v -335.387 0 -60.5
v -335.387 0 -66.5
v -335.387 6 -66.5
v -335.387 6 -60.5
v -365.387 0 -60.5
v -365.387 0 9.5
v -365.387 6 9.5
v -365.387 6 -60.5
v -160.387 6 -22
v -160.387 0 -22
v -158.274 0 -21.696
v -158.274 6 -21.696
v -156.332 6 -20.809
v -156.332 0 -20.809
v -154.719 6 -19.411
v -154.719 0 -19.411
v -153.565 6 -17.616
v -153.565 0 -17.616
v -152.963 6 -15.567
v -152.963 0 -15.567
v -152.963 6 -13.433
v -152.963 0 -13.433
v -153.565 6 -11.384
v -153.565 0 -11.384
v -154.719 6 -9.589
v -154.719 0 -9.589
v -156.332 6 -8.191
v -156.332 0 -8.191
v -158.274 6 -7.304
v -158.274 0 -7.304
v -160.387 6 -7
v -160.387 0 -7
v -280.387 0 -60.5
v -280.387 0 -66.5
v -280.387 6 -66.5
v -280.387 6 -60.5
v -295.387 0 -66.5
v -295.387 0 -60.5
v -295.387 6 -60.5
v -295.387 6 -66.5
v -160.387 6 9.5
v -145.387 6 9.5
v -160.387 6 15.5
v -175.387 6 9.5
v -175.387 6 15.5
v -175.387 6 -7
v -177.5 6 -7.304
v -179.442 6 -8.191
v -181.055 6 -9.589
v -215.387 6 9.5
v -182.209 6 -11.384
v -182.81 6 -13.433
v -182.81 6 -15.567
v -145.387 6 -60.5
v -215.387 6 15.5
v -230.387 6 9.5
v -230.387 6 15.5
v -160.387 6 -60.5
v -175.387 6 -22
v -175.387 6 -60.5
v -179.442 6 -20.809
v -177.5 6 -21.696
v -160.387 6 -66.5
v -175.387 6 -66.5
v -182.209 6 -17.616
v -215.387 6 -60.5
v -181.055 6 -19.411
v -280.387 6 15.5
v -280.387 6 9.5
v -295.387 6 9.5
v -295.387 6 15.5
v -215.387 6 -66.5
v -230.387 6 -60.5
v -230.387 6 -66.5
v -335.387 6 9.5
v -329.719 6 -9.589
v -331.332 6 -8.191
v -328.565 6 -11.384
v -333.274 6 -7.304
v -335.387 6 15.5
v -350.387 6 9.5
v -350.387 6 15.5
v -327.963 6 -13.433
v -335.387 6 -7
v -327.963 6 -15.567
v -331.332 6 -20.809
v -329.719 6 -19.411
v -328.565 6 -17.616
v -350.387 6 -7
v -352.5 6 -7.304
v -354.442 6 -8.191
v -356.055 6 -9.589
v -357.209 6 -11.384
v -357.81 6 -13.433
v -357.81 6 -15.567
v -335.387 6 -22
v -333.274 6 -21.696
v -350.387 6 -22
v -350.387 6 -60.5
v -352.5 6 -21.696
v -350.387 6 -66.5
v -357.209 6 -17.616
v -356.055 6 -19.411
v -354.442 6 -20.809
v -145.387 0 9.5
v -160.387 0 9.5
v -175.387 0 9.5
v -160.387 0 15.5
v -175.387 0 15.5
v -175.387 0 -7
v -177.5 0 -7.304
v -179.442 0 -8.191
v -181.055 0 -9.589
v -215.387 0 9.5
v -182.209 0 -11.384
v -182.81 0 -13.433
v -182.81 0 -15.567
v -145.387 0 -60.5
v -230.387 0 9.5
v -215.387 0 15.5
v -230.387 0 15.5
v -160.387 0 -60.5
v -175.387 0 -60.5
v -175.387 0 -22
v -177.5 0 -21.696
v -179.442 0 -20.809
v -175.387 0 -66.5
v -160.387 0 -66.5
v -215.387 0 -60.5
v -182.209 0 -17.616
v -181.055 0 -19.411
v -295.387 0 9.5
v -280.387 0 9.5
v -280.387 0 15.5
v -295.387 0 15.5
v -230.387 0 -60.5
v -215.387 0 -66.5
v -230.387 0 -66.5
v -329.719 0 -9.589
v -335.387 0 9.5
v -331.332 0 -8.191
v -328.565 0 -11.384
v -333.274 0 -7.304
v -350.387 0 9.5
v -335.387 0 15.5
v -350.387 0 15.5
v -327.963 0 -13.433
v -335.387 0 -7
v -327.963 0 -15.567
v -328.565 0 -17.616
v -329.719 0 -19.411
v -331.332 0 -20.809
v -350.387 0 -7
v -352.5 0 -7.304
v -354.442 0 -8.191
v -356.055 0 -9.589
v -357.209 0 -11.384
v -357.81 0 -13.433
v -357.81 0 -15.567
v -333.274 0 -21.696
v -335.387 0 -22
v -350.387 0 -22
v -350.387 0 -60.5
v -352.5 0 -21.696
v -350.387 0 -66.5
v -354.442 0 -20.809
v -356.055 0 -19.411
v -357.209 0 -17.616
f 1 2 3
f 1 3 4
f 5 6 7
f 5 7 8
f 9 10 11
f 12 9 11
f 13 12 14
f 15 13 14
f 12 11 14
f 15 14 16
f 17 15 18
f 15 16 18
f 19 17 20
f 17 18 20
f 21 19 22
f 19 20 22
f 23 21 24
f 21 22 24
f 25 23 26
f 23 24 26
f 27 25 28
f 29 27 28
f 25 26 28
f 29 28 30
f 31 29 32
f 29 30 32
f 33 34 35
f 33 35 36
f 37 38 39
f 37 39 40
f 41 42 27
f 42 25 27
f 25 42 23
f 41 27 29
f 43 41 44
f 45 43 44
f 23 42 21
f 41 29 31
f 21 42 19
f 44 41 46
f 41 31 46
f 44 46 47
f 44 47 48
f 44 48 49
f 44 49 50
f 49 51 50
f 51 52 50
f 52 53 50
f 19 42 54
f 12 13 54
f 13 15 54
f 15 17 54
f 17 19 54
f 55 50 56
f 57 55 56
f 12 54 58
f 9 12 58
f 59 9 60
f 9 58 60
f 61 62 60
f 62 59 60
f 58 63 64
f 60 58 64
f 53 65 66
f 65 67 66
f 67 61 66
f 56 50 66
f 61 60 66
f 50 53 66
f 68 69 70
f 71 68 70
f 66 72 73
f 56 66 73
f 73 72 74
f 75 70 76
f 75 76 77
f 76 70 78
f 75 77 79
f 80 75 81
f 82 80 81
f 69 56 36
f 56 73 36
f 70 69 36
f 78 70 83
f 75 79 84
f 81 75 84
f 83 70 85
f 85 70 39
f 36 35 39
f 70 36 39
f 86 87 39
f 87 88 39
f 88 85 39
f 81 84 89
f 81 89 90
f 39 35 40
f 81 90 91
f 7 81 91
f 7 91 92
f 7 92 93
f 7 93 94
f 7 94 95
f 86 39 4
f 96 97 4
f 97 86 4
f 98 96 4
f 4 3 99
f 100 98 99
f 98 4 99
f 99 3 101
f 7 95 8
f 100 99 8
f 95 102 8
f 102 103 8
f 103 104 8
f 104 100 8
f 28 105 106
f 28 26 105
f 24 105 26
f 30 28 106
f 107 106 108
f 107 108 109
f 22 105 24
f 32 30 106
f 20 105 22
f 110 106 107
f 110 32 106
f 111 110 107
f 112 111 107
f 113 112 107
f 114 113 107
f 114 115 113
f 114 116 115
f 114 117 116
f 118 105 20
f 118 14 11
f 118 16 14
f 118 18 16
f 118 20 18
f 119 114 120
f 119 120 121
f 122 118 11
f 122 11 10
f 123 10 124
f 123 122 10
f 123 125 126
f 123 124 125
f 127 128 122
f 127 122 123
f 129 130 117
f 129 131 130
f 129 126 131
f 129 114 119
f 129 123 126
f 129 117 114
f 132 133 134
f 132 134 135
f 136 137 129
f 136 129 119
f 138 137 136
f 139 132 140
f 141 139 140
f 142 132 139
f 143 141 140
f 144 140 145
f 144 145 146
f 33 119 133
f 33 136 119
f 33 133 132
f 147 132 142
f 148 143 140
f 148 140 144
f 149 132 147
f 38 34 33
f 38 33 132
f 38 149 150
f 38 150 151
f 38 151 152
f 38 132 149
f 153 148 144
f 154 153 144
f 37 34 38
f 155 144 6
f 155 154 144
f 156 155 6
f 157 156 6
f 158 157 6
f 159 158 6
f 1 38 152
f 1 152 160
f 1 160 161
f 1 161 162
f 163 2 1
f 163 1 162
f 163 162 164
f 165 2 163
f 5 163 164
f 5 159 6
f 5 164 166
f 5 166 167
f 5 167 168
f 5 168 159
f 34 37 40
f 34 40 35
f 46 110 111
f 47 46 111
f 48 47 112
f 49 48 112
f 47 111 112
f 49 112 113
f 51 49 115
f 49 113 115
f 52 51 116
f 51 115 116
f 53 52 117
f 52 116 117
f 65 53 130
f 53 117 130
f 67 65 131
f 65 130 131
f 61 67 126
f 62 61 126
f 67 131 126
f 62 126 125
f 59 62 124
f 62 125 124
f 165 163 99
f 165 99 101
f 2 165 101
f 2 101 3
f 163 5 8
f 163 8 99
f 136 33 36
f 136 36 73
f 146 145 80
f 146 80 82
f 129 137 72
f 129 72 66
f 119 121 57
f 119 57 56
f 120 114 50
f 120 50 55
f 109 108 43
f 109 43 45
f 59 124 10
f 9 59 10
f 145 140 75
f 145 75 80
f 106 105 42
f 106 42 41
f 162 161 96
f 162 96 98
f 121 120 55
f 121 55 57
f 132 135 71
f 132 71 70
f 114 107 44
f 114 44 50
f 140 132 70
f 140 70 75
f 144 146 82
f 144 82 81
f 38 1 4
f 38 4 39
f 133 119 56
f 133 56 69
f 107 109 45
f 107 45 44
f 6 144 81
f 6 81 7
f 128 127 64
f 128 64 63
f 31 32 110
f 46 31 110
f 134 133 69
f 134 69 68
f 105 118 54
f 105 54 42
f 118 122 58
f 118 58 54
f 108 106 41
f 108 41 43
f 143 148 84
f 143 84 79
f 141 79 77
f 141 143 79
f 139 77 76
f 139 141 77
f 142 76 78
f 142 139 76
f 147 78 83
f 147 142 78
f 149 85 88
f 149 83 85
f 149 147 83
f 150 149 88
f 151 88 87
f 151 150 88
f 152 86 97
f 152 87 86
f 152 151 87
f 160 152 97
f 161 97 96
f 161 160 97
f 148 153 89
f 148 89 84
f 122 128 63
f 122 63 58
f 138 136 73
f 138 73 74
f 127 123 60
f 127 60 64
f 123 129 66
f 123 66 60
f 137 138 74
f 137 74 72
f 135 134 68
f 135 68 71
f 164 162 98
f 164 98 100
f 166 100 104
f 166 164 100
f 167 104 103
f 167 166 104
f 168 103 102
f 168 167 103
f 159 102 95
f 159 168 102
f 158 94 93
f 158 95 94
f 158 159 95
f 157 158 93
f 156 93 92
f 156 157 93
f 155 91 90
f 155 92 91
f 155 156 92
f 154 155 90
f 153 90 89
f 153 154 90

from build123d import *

# Parameters (mm, degrees)
BOSS_EXTRUDE1_DEPTH = 6
CUT_EXTRUDE1_DEPTH  = 10


with BuildPart() as part:
    # Sketch1 → Boss-Extrude1 (new body)
    with BuildSketch(Plane(origin=(0, 0, 0), x_dir=(1, 0, 0), z_dir=(0, 1, 0))):
        Polygon((-160.386748432, 60.5), (-145.386748432, 60.5), (-145.386748432, -9.5), (-160.386748432, -9.5), (-160.386748432, -15.5), (-175.386748432, -15.5), (-175.386748432, -9.5), (-215.386748432, -9.5), (-215.386748432, -15.5), (-230.386748432, -15.5), (-230.386748432, -9.5), (-280.386748432, -9.5), (-280.386748432, -15.5), (-295.386748432, -15.5), (-295.386748432, -9.5), (-335.386748432, -9.5), (-335.386748432, -15.5), (-350.386748432, -15.5), (-350.386748432, -9.5), (-365.386748432, -9.5), (-365.386748432, 60.5), (-350.386748432, 60.5), (-350.386748432, 66.5), (-335.386748432, 66.5), (-335.386748432, 60.5), (-295.386748432, 60.5), (-295.386748432, 66.5), (-280.386748432, 66.5), (-280.386748432, 60.5), (-230.386748432, 60.5), (-230.386748432, 66.5), (-215.386748432, 66.5), (-215.386748432, 60.5), (-175.386748432, 60.5), (-175.386748432, 66.5), (-160.386748432, 66.5), align=None)
    extrude(amount=BOSS_EXTRUDE1_DEPTH)

    # Sketch2 → Cut-Extrude1 (cut)
    with BuildSketch(Plane.XZ):
        with BuildLine():
            Line((-350.386748432, -7), (-335.386748432, -7))
            ThreePointArc((-335.386748432, -7), (-327.886748432, -14.5), (-335.386748432, -22))
            Line((-335.386748432, -22), (-350.386748432, -22))
            ThreePointArc((-350.386748432, -22), (-357.886748432, -14.5), (-350.386748432, -7))
        make_face()
        with BuildLine():
            Line((-175.386748432, -22), (-160.386748432, -22))
            ThreePointArc((-160.386748432, -22), (-152.886748432, -14.5), (-160.386748432, -7))
            Line((-160.386748432, -7), (-175.386748432, -7))
            ThreePointArc((-175.386748432, -7), (-182.886748432, -14.5), (-175.386748432, -22))
        make_face()
    extrude(amount=-CUT_EXTRUDE1_DEPTH, mode=Mode.SUBTRACT)


solid = part.part
